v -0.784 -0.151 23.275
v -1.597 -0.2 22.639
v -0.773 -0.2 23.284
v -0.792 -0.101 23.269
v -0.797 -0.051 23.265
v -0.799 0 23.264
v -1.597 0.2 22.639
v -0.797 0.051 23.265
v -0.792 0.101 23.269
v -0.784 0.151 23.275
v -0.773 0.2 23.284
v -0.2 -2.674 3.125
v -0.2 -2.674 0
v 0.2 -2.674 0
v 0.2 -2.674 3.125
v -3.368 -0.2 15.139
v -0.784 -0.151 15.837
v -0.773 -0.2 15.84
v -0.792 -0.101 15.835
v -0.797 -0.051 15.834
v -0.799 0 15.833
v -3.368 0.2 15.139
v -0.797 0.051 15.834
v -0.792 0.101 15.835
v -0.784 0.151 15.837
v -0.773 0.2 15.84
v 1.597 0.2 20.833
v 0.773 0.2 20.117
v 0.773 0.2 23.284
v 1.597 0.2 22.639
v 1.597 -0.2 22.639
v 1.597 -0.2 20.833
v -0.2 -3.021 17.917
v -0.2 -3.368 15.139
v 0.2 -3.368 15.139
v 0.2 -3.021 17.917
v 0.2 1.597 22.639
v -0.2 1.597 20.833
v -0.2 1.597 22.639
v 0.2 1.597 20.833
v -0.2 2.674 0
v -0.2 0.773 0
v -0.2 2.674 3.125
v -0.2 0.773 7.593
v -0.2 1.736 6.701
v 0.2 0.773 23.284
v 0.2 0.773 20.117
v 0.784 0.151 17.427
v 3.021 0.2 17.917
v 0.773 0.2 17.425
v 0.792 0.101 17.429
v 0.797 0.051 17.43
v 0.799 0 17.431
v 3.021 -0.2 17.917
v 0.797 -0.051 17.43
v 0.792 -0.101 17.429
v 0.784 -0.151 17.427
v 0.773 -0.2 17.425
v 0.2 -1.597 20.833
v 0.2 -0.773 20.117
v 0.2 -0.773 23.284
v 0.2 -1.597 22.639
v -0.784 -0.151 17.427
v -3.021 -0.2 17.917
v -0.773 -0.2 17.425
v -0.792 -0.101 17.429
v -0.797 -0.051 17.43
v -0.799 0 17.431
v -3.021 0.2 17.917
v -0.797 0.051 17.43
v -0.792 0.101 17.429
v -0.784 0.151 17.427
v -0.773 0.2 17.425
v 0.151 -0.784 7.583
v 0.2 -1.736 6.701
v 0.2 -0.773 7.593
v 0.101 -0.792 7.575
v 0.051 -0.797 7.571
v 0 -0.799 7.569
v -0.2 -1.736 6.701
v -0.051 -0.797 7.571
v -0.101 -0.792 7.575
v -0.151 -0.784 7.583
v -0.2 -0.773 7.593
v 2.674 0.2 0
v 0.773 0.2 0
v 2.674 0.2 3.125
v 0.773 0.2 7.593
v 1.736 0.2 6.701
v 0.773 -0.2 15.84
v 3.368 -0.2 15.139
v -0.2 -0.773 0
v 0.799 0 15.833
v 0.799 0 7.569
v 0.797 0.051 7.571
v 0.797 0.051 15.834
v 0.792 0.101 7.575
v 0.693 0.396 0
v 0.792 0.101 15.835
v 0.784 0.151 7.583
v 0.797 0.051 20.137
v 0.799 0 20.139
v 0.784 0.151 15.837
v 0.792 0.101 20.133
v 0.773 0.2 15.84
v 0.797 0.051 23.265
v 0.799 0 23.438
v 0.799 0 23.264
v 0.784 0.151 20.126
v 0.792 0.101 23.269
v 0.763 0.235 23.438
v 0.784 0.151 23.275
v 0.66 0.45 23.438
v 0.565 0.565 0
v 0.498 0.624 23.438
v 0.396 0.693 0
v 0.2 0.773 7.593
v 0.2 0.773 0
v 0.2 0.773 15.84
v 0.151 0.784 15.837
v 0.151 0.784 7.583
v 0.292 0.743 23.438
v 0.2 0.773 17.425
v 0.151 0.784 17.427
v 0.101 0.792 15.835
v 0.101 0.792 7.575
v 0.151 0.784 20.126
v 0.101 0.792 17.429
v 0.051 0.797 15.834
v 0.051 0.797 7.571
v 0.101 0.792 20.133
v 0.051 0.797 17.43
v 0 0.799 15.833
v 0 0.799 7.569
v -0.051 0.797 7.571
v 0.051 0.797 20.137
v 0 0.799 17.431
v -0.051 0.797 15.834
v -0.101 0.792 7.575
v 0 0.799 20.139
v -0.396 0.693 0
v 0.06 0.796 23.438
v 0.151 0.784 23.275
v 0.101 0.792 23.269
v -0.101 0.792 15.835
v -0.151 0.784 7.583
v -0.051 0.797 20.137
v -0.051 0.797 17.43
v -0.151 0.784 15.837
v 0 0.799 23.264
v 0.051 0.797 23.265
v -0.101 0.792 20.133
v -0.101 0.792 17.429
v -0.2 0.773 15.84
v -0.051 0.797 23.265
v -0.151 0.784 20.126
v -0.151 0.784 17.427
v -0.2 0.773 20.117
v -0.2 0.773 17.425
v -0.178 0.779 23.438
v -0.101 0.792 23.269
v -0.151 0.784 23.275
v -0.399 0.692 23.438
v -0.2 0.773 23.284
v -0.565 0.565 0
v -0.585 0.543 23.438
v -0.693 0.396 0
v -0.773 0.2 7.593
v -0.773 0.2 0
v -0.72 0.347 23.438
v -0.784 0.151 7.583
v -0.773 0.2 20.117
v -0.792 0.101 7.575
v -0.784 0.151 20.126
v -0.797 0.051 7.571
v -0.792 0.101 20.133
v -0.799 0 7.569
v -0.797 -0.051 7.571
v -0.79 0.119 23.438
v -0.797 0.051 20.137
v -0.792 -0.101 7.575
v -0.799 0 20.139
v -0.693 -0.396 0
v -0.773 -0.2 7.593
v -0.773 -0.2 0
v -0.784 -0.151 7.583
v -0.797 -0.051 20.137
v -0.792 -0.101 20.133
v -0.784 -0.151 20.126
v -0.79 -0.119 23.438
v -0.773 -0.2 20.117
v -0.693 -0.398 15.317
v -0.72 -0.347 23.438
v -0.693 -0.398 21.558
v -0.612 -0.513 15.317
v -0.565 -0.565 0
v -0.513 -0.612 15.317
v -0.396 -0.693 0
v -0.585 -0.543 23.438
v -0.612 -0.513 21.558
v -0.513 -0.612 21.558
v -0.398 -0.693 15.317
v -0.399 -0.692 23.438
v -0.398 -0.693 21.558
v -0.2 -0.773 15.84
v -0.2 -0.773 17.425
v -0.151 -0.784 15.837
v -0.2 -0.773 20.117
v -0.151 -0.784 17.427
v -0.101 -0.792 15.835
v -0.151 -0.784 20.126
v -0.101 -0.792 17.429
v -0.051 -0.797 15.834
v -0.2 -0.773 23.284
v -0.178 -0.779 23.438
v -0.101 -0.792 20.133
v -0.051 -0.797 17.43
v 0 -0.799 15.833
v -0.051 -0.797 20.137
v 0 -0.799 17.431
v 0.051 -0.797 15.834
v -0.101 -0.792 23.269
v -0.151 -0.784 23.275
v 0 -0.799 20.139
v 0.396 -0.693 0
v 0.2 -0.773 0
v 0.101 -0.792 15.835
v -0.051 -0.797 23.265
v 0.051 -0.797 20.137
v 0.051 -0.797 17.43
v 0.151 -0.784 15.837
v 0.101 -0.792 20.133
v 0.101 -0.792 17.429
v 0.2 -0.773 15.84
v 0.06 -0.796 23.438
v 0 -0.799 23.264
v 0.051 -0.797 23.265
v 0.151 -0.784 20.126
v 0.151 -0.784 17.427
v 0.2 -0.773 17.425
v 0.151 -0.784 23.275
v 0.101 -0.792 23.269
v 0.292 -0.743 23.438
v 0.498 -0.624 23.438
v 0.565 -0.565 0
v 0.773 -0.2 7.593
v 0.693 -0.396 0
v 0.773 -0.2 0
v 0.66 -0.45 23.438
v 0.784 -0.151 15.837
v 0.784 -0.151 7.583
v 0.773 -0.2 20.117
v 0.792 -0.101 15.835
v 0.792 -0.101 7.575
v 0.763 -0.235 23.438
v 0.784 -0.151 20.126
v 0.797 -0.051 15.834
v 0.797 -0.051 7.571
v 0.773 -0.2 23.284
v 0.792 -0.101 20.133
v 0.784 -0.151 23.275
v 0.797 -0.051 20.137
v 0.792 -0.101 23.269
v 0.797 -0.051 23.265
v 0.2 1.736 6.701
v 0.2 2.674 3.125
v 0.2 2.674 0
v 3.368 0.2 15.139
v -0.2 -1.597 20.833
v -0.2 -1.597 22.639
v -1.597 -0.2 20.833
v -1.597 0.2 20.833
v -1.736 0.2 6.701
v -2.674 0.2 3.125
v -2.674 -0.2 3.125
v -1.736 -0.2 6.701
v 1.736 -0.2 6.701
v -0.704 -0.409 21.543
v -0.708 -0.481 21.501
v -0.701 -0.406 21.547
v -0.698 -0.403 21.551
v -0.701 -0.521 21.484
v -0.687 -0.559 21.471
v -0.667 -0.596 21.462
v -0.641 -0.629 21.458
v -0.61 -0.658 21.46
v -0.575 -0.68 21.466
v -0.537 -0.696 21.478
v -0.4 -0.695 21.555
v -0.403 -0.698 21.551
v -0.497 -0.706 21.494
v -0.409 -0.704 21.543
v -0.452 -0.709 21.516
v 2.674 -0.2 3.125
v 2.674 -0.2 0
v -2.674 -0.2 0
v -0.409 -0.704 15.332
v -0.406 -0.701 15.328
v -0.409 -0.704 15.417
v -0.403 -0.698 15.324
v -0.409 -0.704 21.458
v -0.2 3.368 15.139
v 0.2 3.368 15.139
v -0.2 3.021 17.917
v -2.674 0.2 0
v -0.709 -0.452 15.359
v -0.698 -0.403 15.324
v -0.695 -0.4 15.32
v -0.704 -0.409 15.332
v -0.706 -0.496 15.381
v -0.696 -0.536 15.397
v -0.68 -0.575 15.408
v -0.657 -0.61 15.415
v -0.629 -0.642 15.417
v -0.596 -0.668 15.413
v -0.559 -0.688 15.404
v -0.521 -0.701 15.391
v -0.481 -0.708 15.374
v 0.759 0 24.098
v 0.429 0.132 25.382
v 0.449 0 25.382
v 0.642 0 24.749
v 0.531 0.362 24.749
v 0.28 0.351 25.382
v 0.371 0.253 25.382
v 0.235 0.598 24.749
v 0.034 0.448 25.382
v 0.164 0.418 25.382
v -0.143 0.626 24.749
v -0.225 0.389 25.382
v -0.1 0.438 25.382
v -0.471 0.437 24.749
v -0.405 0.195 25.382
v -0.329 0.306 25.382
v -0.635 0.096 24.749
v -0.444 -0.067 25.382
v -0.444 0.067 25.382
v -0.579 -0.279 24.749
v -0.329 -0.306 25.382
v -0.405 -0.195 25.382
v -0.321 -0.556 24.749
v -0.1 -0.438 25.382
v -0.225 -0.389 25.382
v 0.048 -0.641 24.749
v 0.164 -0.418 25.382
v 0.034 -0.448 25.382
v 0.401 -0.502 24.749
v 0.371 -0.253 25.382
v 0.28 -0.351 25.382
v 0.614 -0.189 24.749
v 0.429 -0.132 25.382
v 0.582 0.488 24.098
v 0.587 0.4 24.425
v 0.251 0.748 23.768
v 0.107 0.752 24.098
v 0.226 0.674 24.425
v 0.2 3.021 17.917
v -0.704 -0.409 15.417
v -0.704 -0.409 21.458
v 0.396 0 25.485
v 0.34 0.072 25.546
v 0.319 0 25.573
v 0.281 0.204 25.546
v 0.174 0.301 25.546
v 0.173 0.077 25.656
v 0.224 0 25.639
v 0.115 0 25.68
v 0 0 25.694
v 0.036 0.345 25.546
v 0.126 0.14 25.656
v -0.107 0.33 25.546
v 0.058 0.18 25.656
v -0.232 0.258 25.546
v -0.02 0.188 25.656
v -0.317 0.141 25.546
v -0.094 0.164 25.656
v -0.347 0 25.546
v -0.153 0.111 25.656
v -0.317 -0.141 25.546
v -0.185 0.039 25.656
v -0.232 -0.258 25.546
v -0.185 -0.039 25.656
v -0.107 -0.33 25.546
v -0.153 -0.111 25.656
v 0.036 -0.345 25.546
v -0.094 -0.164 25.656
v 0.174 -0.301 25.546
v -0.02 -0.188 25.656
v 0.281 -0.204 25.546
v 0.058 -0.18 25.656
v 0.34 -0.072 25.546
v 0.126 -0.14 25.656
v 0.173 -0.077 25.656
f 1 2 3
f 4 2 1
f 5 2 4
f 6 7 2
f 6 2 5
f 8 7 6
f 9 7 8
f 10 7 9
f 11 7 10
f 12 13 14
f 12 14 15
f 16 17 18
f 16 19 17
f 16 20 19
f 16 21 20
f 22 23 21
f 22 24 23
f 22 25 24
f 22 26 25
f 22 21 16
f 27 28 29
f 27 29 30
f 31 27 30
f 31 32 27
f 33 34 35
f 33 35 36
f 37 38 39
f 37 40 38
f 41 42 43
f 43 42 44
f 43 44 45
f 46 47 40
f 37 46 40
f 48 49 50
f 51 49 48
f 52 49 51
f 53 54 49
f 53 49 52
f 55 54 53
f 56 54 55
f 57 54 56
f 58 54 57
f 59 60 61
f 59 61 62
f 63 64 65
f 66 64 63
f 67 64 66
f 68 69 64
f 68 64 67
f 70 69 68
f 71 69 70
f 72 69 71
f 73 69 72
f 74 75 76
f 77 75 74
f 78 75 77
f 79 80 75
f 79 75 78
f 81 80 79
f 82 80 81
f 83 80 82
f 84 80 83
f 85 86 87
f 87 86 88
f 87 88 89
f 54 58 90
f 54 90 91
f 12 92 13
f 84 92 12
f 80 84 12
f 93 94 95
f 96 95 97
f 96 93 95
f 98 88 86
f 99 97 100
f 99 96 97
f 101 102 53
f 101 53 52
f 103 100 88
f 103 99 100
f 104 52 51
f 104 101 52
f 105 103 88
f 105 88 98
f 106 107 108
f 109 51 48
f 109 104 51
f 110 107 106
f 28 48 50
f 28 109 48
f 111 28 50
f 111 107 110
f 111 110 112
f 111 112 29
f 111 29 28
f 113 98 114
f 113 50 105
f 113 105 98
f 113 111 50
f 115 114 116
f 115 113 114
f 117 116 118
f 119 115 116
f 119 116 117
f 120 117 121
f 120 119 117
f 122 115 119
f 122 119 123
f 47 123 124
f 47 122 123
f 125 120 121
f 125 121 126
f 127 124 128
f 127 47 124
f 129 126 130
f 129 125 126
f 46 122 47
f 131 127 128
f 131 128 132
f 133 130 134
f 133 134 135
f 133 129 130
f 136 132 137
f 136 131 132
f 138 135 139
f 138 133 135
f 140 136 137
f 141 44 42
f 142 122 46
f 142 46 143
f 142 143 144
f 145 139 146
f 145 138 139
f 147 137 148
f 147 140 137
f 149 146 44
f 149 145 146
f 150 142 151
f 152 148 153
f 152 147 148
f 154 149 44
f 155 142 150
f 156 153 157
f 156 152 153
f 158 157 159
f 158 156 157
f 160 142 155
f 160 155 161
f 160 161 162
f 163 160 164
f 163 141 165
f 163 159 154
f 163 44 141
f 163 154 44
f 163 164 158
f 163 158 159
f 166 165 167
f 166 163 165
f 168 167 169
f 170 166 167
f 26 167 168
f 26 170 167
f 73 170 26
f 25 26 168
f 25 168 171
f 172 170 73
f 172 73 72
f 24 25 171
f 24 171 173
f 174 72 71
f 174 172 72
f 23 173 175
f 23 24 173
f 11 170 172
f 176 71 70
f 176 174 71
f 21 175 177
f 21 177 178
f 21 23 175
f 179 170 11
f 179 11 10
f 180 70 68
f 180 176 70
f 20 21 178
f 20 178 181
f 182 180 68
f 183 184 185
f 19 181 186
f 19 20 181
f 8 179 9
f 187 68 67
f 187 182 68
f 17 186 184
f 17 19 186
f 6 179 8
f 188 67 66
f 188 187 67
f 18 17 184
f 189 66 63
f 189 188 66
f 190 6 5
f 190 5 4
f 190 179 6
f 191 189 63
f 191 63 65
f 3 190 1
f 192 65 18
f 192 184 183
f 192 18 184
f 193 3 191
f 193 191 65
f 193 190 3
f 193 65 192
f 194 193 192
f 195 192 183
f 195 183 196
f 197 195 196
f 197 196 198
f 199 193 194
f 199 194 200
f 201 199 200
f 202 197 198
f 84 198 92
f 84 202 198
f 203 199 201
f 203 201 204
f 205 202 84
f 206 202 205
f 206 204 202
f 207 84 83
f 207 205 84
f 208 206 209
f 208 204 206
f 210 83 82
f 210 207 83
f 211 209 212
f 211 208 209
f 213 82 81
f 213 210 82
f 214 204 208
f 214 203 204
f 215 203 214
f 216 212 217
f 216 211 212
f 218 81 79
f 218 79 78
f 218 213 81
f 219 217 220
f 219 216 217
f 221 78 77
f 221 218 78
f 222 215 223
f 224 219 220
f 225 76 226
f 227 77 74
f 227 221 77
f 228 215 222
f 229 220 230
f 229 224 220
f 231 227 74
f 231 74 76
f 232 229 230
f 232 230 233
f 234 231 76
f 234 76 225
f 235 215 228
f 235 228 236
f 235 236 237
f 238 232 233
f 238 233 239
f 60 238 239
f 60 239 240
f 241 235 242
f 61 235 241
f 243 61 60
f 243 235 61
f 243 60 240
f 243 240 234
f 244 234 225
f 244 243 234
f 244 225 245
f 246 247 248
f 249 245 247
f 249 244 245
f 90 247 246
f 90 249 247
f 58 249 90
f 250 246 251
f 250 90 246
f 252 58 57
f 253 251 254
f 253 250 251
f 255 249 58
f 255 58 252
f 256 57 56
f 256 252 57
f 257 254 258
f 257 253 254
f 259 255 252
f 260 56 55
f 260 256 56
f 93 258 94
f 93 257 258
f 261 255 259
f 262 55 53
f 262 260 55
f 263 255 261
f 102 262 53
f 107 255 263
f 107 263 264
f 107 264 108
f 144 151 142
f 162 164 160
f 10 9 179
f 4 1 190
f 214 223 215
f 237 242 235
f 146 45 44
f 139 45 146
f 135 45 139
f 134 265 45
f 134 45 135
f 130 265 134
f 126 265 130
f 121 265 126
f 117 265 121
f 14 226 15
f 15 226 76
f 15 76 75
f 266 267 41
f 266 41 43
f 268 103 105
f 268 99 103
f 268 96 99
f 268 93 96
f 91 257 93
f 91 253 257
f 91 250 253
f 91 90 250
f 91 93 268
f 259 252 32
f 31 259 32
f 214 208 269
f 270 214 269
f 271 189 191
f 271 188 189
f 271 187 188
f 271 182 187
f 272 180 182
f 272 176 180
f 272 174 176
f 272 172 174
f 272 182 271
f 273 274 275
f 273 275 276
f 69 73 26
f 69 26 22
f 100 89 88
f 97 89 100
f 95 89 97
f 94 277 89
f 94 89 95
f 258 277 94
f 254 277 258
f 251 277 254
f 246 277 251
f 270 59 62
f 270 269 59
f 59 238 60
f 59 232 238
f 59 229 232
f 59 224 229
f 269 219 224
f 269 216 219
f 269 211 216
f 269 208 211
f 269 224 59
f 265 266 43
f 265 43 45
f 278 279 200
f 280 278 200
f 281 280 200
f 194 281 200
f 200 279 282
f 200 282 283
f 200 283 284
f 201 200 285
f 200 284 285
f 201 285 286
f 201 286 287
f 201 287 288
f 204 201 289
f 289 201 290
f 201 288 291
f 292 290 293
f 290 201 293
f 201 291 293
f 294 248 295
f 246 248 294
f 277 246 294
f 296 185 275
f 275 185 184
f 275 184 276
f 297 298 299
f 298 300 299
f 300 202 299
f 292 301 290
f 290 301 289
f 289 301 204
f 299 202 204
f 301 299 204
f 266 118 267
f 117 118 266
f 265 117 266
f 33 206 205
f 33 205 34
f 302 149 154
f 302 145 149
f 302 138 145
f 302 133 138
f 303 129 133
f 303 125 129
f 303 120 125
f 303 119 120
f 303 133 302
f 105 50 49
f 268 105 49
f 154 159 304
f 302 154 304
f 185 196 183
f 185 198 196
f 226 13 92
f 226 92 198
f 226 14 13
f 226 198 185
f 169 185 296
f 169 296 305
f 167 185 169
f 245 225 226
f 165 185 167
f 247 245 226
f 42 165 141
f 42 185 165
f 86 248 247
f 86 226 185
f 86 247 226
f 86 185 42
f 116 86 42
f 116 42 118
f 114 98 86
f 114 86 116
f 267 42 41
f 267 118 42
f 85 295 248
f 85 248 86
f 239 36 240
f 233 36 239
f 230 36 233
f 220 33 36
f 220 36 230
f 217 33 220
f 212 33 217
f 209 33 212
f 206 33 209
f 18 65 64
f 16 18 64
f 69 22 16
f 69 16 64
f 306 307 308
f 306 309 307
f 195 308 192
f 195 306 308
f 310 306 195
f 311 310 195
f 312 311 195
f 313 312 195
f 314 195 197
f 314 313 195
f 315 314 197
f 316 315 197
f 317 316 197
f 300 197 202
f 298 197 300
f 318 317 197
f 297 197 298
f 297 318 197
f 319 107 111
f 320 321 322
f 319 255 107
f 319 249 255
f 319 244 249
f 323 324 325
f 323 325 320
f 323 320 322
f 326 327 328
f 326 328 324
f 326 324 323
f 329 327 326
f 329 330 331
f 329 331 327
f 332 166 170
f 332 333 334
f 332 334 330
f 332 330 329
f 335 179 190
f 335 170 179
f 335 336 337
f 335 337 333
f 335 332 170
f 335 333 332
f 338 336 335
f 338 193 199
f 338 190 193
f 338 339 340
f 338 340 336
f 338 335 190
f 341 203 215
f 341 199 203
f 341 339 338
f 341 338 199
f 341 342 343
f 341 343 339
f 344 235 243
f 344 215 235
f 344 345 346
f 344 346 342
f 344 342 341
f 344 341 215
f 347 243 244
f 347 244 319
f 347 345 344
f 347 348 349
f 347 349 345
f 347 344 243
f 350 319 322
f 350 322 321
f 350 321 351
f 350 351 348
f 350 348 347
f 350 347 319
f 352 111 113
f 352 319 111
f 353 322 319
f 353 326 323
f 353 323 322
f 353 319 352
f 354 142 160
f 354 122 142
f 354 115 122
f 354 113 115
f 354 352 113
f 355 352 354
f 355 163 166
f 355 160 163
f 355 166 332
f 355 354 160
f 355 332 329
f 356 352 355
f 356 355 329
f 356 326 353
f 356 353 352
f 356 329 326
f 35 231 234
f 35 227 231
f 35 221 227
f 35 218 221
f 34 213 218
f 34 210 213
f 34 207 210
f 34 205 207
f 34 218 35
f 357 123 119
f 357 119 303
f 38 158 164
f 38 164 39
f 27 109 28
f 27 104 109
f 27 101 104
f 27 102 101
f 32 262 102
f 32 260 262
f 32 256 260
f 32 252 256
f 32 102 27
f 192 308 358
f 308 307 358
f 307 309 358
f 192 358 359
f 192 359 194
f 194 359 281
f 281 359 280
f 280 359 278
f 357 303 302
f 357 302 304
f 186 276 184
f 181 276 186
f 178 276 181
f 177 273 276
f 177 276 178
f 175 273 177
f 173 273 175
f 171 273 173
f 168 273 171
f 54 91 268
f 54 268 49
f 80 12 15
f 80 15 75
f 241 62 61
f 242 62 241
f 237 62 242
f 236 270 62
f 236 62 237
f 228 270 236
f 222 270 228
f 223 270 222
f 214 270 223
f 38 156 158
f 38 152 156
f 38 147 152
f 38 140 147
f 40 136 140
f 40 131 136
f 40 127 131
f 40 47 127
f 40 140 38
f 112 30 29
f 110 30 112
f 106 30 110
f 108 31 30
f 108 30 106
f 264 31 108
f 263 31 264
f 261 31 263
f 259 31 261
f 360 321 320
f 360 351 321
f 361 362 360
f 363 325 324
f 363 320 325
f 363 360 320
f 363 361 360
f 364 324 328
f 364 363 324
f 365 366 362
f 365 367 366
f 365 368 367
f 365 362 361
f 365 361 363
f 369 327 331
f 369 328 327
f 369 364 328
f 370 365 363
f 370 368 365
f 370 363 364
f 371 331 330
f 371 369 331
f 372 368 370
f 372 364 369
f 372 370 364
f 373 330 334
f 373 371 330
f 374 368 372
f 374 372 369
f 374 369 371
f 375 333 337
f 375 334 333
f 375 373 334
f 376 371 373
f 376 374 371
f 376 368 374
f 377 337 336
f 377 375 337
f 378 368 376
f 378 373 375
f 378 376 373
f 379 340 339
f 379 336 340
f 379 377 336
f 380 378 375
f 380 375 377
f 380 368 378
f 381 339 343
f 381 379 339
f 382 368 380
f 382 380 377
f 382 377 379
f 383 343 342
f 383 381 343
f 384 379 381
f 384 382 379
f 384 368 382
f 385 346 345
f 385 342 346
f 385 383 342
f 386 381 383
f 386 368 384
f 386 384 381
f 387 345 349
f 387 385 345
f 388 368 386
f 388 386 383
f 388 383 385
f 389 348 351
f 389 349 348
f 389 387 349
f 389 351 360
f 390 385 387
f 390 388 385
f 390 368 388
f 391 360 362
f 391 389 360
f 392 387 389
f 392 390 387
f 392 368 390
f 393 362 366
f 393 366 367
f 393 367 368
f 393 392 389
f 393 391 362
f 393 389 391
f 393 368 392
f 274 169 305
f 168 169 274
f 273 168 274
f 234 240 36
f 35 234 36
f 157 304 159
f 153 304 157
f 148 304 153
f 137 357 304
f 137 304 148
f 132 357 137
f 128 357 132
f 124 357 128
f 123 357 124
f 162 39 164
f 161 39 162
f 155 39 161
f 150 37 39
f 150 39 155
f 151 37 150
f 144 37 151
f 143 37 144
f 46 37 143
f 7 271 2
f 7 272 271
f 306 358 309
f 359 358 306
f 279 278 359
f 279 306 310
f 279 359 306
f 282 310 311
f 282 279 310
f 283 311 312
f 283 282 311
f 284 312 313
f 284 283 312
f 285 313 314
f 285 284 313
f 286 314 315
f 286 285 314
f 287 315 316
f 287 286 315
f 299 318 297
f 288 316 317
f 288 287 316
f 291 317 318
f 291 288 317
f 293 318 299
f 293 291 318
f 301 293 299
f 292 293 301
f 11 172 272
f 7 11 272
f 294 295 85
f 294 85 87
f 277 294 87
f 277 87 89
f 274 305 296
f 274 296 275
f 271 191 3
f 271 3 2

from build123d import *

# Parameters (mm, degrees)
F4_DEPTH     = 0.2
F5_COUNT     = 4
F8_DEPTH     = 6.0416666667
F9_T4_ANGLE  = 67.1804235359
F9_S7_R      = 0.25
F9_T8_DEPTH  = 2
F9_T12_ANGLE = 67.1804235359
F9_S15_R     = 0.25
F9_T16_DEPTH = 2


# Not quite as in the source:
# - a fillet or chamfer that OpenCascade refuses, or shapes differently, is made with other operations: its cross-section is extruded or revolved along the edge and cut away or added


with BuildPart() as f2:
    # F1 (on Front) → F2 (revolve)
    with BuildSketch(Plane.XZ):
        with BuildLine():
            Line((0, 25.6944444444), (0, 0))
            Line((0, 0), (0.7986111111, 0))
            Line((0.7986111111, 0), (0.7986111111, 23.4375))
            ThreePointArc((0.7986111111, 23.4375), (0.7106013269, 24.425281766), (0.4493446353, 25.3819444444))
            ThreePointArc((0.4493446353, 25.3819444444), (0.2736635029, 25.6086390085), (0, 25.6944444444))
        make_face()
    revolve(axis=Axis((0, 0, 12.8472222222), (0, 0, 1)))

    # F3 (on Front) → F4 (join, symmetric)
    with BuildSketch(Plane.XZ):
        Polygon((0, 23.8888888889), (0, 0), (0.7986111111, 0), (2.6736111111, 0), (2.6736111111, 3.125), (1.7361111111, 6.7013888889), (0.4, 7.9385288066), (0.4, 15.9410660661), (3.3680555556, 15.1388888889), (3.0208333333, 17.9166666667), (0.4, 17.343359375), (0.4, 19.7922705314), (1.5972222222, 20.8333333333), (1.5972222222, 22.6388888889), align=None)
    extrude(amount=F4_DEPTH, both=True)

    # F5: F2 ×4 about axis
    f5_axis = Axis((0, 0, 0), (0, 0, 1))


with BuildPart() as f2_1:
    add(f2.part)
    for i in range(1, F5_COUNT):
        add(f2.part.rotate(f5_axis, i * 360 / F5_COUNT))

    # F7 (on offset) → F8 (join)
    with BuildSketch(Plane.XY.offset(15.4166666667)):
        with BuildLine():
            Line((-0.4086259328, -0.7035839656), (-0.1424359704, -0.4373940032))
            Line((-0.1424359704, -0.4373940032), (-0.4373940032, -0.1424359704))
            Line((-0.4373940032, -0.1424359704), (-0.7035839656, -0.4086259328))
            ThreePointArc((-0.7035839656, -0.4086259328), (-0.6354140103, -0.6354140103), (-0.4086259328, -0.7035839656))
        make_face()
    extrude(amount=F8_DEPTH)

    # F9: chamfer of 0.1 on 2 edges, made by hand


with BuildPart() as f9_tool2:
    # F9_s3 → F9_t4 (revolve)
    with BuildSketch(Plane(origin=(0, 0, 0), x_dir=(0, 0, 1), z_dir=(-0.197824804, 0.9802373932, 0))):
        Polygon((21.5583333333, -0.7986111111), (21.4583333333, -0.8986111111), (21.4583333333, -0.7986111111), align=None)
    revolve(axis=Axis((0, 0, 21.4583333333), (0, 0, 1)), revolution_arc=F9_T4_ANGLE)

    split(bisect_by=Plane(origin=(0.1474790164, -0.1474790164, 0), x_dir=(0, 0, 1), z_dir=(-0.7071067812, 0.7071067812, 0)), keep=Keep.TOP)

    split(bisect_by=Plane(origin=(-0.1474790164, 0.1474790164, 0), x_dir=(0, 0, 1), z_dir=(0.7071067812, -0.7071067812, 0)), keep=Keep.TOP)

    # F9_s7 → F9_t8 (intersect, symmetric)
    with BuildSketch(Plane.XY.offset(21.5)):
        with Locations((-0.458637315, -0.458637315)):
            Circle(F9_S7_R)
    extrude(amount=F9_T8_DEPTH, both=True, mode=Mode.INTERSECT)


with BuildPart() as f2_2:
    add(f2_1.part)

    # F9_t1: union F9_tool2
    add(f9_tool2.part)


with BuildPart() as f9_tool10:
    # F9_s11 → F9_t12 (revolve)
    with BuildSketch(Plane(origin=(0, 0, 0), x_dir=(0, 0, 1), z_dir=(-0.197824804, 0.9802373932, 0))):
        Polygon((15.3166666667, -0.7986111111), (15.4166666667, -0.8986111111), (15.4166666667, -0.7986111111), align=None)
    revolve(axis=Axis((0, 0, 15.4166666667), (0, 0, 1)), revolution_arc=F9_T12_ANGLE)

    split(bisect_by=Plane(origin=(0.1474790164, -0.1474790164, 0), x_dir=(0, 0, 1), z_dir=(-0.7071067812, 0.7071067812, 0)), keep=Keep.TOP)

    split(bisect_by=Plane(origin=(-0.1474790164, 0.1474790164, 0), x_dir=(0, 0, 1), z_dir=(0.7071067812, -0.7071067812, 0)), keep=Keep.TOP)

    # F9_s15 → F9_t16 (intersect, symmetric)
    with BuildSketch(Plane.XY.offset(15.4)):
        with Locations((-0.458637315, -0.458637315)):
            Circle(F9_S15_R)
    extrude(amount=F9_T16_DEPTH, both=True, mode=Mode.INTERSECT)


with BuildPart() as f2_3:
    add(f2_2.part)

    # F9_t9: union F9_tool10
    add(f9_tool10.part)


solid = f2_3.part
